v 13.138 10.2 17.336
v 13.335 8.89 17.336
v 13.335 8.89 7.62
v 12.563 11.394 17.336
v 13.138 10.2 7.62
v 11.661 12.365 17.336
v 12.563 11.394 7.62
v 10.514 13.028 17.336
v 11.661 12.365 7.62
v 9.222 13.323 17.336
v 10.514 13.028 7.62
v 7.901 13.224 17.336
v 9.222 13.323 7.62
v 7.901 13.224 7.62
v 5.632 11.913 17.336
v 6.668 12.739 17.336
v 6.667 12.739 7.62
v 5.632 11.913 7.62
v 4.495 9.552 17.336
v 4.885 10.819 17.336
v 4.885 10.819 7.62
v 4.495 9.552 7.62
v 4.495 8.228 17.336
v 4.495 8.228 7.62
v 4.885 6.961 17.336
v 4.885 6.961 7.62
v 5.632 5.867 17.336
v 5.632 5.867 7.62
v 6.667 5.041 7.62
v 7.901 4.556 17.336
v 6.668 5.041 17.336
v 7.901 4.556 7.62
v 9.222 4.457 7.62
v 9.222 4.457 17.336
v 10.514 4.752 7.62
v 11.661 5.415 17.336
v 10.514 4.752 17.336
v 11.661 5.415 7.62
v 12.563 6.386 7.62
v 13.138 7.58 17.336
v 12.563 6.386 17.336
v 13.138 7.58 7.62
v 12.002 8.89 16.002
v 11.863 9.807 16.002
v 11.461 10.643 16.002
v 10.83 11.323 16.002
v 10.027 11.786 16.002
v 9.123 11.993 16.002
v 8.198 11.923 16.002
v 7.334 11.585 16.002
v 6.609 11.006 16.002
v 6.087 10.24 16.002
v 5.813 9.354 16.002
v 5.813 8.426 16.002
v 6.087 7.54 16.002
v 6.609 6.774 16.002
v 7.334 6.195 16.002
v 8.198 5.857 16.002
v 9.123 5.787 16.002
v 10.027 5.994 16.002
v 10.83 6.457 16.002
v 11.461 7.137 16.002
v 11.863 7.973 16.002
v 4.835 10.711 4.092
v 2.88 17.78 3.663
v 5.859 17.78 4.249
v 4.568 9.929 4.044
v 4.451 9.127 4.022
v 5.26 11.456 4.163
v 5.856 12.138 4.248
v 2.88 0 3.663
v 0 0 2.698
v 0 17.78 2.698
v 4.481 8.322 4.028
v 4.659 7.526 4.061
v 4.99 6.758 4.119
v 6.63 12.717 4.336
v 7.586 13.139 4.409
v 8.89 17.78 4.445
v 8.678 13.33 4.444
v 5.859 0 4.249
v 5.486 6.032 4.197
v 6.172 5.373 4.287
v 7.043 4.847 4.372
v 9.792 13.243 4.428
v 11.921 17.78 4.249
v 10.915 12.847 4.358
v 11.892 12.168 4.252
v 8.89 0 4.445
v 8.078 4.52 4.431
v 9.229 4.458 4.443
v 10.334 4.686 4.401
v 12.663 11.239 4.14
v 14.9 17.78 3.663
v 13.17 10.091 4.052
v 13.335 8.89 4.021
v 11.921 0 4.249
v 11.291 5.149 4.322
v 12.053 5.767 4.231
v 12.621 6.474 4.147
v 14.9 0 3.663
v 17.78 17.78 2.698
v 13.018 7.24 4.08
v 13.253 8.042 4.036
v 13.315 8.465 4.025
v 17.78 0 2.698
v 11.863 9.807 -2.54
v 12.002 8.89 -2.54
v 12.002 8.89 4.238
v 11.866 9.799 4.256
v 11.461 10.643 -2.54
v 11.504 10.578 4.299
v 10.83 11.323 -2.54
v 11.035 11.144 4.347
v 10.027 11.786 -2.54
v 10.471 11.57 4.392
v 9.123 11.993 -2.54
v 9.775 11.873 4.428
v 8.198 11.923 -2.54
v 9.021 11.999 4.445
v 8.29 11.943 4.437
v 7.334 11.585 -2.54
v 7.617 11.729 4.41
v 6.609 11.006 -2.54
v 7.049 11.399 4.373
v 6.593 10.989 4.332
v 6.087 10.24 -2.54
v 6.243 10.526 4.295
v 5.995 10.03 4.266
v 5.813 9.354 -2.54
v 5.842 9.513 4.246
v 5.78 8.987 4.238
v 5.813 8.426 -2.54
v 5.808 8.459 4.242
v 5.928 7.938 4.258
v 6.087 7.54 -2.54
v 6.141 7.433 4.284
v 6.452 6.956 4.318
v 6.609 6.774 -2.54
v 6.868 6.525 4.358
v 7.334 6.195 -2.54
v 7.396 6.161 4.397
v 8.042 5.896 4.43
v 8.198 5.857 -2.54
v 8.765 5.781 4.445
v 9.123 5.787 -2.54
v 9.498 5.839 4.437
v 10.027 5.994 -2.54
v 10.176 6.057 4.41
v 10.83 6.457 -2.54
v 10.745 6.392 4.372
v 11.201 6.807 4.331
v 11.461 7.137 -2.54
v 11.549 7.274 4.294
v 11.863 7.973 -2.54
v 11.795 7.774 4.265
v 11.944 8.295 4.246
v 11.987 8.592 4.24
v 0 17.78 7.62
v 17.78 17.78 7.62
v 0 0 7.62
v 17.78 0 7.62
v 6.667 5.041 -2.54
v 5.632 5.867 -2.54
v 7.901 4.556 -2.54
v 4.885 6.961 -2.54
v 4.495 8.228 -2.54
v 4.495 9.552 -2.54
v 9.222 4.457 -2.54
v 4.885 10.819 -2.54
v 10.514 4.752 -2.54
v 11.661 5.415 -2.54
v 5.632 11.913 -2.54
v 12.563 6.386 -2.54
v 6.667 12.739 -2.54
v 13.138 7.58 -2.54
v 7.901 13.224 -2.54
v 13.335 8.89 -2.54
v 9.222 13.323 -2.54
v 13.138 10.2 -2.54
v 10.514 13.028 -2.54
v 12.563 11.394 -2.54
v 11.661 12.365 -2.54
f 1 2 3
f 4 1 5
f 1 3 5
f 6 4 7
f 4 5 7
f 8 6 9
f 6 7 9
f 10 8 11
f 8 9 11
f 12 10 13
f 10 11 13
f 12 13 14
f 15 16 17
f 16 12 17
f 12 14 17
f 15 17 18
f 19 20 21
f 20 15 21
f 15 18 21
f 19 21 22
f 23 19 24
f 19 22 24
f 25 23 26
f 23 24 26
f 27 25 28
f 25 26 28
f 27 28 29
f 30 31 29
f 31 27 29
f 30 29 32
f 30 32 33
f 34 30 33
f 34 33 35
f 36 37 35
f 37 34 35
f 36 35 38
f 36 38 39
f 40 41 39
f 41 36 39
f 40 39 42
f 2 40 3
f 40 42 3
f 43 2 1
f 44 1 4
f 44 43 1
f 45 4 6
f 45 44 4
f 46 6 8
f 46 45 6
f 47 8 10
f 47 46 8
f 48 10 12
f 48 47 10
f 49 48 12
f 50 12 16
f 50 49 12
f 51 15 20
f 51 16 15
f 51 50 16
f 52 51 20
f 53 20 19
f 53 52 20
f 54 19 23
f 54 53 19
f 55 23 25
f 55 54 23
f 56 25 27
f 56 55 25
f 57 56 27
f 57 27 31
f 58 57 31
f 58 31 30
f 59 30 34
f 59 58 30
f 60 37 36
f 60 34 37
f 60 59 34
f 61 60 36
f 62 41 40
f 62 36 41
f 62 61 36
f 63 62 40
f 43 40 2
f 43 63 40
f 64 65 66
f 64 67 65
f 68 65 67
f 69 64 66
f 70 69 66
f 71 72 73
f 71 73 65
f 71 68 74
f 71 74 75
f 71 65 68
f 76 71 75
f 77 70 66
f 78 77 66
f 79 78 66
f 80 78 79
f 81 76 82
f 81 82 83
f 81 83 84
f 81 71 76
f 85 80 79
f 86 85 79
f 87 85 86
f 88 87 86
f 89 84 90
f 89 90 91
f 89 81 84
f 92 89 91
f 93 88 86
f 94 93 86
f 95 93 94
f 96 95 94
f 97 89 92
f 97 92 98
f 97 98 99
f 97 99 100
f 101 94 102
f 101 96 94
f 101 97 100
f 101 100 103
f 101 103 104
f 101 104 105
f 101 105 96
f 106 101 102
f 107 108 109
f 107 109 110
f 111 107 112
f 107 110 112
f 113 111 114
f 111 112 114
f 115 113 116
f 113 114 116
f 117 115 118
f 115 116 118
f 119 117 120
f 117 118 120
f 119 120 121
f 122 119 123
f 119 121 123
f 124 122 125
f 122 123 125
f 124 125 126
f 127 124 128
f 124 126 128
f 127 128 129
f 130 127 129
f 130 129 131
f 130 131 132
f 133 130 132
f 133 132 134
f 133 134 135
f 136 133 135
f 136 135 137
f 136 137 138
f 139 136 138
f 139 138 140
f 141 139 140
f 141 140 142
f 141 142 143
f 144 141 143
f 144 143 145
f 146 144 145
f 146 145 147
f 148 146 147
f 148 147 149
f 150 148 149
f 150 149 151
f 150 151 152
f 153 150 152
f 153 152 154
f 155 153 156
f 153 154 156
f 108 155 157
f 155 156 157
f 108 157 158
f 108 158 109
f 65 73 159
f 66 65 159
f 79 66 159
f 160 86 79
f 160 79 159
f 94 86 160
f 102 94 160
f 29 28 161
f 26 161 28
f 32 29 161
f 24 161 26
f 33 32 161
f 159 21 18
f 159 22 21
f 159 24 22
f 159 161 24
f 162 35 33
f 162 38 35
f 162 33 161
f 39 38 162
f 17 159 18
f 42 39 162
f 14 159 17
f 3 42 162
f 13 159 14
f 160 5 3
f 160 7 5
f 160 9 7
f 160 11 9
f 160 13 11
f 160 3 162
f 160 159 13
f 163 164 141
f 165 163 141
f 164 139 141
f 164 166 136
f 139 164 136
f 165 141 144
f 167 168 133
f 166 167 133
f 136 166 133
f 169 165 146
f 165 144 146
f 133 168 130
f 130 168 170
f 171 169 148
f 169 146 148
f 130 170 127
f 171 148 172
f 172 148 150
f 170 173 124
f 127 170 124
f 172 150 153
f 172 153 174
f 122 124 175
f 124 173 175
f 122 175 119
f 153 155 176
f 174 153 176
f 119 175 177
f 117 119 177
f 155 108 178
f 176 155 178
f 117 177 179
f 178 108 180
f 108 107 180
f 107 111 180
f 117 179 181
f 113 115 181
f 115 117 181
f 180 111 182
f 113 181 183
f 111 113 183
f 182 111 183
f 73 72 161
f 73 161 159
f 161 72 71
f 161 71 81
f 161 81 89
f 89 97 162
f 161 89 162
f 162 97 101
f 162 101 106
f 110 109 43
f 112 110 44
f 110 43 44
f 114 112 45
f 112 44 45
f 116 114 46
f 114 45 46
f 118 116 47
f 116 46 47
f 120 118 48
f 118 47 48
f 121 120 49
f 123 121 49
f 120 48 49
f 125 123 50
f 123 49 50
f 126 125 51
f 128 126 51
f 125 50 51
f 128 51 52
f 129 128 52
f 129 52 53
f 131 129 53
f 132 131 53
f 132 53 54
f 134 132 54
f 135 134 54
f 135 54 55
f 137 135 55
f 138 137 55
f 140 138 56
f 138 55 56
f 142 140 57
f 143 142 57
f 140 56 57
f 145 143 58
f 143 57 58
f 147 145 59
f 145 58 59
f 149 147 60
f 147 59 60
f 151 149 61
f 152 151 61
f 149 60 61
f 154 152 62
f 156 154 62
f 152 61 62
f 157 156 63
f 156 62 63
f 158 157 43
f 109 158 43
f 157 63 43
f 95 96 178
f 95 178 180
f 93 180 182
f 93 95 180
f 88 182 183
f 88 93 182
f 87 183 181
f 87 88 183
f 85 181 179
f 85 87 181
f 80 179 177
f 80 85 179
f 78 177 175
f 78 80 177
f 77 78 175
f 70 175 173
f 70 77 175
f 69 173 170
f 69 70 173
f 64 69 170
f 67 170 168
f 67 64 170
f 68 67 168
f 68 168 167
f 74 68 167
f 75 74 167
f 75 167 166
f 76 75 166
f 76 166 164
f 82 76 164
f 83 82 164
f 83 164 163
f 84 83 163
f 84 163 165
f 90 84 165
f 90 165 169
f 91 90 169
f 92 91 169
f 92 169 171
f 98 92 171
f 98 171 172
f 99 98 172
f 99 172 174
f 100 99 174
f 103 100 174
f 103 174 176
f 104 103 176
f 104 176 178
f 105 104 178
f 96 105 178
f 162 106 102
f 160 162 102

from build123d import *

# Parameters (mm, degrees)
F0_W     = 17.78
F0_H     = 17.78
F1_DEPTH = 7.62
F3_W     = 5.08
F3_H     = 22.724437993
F5_R     = 4.445
F5_R_2   = 3.1115
F6_DEPTH = 10.16
F7_DEPTH = 25.4
F8_DEPTH = 10.16


# Not quite as in the source:
# - a fillet or chamfer that OpenCascade refuses, or shapes differently, is made with other operations: its cross-section is extruded or revolved along the edge and cut away or added


with BuildPart() as f1:
    # F0 (on Top) → F1 (new body)
    with BuildSketch(Plane.XY):
        with Locations((8.89, 8.89)):
            Rectangle(F0_W, F0_H)
    extrude(amount=F1_DEPTH)

    # F3 (on offset) → F4 (revolve, cut)
    with BuildSketch(Plane(origin=(0, 0, -19.05), x_dir=(1, 0, 0), z_dir=(0, 0, -1))):
        with Locations((-12.065, -8.8908823673)):
            Rectangle(F3_W, F3_H)
    revolve(axis=Axis((8.89, 12.1113763889, -19.05), (0, 1, 0)), mode=Mode.SUBTRACT)

    # F5 (on face) → F6 (join)
    with BuildSketch(Plane.XY.offset(7.62)):
        with Locations((8.89, 8.89)):
            Circle(F5_R)
        with Locations((8.89, 8.89)):
            Circle(F5_R_2, mode=Mode.SUBTRACT)
    extrude(amount=F6_DEPTH)

    # F7 (cut): a face of the model
    f7_faces = [f1.faces().sort_by_distance(p)[0] for p in [
        (8.89, 8.89, 7.62),
    ]]
    extrude(f7_faces, amount=-F7_DEPTH, mode=Mode.SUBTRACT)

    # F5 (on face) → F8 (join)
    with BuildSketch(Plane.XY.offset(7.62)):
        with Locations((8.89, 8.89)):
            Circle(F5_R)
        with Locations((8.89, 8.89)):
            Circle(F5_R_2, mode=Mode.SUBTRACT)
    extrude(amount=-F8_DEPTH)

    # F9: chamfer of 1.778 on 1 edges, made by hand

    # F9_s1 → F9_t2 (revolve, cut)
    with BuildSketch(Plane.XZ.offset(-8.89)):
        Polygon((13.7795, 17.78), (12.0015, 16.002), (12.0015, 17.78), align=None)
    revolve(axis=Axis((8.89, 8.89, 17.78), (0, 0, 1)), mode=Mode.SUBTRACT)


solid = f1.part
